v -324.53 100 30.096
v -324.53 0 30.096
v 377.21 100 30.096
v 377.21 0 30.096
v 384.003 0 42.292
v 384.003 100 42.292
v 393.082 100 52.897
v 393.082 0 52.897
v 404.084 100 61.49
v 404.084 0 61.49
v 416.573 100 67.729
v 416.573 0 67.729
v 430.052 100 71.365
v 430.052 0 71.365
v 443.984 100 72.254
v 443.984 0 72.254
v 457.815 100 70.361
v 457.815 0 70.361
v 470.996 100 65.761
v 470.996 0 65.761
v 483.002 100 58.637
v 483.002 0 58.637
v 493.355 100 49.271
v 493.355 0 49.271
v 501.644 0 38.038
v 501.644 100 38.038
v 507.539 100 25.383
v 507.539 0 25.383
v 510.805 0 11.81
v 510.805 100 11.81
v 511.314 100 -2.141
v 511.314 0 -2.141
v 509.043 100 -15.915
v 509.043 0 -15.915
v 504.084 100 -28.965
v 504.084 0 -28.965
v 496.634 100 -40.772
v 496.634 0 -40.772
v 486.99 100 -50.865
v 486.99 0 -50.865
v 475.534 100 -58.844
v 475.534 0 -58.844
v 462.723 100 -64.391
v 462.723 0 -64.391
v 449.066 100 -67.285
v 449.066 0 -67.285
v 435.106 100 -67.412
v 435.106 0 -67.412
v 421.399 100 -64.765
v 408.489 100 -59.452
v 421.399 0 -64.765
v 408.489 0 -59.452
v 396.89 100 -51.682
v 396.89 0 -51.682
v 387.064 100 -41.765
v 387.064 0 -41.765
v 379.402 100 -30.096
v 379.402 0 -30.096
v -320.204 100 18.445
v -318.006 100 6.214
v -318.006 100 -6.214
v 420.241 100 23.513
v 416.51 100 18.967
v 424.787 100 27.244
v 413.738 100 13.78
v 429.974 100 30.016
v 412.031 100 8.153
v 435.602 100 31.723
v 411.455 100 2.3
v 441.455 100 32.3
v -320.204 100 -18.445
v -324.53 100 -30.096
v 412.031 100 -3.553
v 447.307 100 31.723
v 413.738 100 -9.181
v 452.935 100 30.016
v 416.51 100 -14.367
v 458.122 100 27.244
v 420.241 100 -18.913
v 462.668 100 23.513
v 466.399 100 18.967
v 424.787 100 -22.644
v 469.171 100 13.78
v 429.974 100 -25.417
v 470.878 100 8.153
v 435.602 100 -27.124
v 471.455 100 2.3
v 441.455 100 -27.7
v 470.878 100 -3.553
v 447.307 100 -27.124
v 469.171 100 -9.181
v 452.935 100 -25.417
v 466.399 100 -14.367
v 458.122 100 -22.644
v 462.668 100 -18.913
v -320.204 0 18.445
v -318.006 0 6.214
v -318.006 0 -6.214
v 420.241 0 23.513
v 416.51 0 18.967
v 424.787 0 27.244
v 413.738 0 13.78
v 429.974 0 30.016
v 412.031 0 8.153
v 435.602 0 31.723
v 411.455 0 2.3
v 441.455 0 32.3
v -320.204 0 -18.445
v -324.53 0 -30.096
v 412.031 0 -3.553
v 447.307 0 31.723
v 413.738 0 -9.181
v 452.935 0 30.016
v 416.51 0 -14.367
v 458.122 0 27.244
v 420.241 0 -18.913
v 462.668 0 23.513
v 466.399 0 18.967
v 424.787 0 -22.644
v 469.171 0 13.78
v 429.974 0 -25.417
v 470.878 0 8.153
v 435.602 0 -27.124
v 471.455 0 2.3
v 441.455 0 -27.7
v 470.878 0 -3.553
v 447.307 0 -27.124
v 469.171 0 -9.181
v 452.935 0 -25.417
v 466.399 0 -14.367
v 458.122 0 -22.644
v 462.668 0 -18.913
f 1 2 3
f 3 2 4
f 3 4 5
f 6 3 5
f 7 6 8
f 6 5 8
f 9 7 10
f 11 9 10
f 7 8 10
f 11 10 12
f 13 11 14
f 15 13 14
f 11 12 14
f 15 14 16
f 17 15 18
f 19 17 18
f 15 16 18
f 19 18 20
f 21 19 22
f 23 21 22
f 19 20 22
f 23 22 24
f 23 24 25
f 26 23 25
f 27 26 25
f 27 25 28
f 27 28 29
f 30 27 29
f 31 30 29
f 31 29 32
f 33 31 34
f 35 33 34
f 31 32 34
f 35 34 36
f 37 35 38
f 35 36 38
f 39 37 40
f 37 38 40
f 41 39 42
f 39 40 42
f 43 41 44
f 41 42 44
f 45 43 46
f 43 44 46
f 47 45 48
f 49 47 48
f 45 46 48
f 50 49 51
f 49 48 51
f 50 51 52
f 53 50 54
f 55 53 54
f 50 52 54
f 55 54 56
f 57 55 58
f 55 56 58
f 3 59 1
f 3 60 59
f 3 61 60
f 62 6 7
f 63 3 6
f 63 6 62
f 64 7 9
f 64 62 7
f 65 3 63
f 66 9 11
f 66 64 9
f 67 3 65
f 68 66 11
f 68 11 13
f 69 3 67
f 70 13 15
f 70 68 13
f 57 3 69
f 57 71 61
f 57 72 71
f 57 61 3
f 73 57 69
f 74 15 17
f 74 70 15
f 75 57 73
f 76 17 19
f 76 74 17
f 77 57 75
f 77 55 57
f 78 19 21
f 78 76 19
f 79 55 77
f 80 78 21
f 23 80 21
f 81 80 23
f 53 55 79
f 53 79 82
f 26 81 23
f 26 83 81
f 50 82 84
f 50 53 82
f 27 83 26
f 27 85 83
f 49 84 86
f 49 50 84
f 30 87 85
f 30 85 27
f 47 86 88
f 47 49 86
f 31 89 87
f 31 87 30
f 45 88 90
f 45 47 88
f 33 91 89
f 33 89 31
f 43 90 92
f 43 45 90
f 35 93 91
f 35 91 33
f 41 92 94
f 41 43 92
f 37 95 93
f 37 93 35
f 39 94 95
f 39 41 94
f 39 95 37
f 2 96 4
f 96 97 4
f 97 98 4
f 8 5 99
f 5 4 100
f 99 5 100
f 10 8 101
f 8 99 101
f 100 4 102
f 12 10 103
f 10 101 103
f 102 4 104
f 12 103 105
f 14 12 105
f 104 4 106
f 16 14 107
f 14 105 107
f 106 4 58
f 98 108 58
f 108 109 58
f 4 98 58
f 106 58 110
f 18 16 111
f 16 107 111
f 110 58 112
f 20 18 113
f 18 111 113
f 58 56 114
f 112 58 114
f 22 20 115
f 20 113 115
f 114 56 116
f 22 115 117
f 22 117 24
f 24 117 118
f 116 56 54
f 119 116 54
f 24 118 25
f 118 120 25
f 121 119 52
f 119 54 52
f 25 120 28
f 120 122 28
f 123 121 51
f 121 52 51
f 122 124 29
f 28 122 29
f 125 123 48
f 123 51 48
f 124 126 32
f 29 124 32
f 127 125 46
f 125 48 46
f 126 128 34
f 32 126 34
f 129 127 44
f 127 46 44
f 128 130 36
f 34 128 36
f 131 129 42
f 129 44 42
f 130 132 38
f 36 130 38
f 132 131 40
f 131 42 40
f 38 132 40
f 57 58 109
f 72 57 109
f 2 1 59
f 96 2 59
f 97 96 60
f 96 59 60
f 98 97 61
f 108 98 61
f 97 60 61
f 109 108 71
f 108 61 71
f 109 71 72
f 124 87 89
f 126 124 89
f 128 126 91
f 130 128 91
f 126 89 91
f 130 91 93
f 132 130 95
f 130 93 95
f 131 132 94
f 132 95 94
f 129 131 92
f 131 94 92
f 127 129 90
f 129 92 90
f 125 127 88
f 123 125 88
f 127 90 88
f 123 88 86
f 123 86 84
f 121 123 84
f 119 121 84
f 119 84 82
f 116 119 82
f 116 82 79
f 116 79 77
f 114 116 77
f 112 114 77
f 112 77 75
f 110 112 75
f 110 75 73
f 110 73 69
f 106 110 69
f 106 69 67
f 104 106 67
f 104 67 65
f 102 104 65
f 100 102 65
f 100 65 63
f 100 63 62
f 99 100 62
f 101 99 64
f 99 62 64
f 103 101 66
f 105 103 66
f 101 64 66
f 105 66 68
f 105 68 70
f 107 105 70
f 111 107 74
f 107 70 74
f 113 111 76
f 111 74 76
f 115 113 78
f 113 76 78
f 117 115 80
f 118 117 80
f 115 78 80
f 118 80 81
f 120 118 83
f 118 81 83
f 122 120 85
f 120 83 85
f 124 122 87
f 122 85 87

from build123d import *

# Parameters (mm, degrees)
BOSS_EXTRU_2_DEPTH      = 100
ESQUISSE5_R             = 30
ENL_V_MAT_EXTRU_4_DEPTH = 101
ESQUISSE6_R             = 70
ENL_V_MAT_EXTRU_5_DEPTH = 101


with BuildPart() as part:
    # Esquisse1 → Boss.-Extru.2 (new body)
    with BuildSketch(Plane(origin=(0, 0, 0), x_dir=(1, 0, 0), z_dir=(0, 1, 0))):
        with BuildLine():
            Line((379.401849177, 30.095541494), (-327.704932009, 30.095541494))
            Line((-327.704932009, 30.095541494), (-327.704932009, -30.095541494))
            Line((-327.704932009, -30.095541494), (377.209706533, -30.095541494))
            ThreePointArc((377.209706533, -30.095541494), (511.408174051, -4.847552565), (379.401849177, 30.095541494))
        make_face()
    extrude(amount=BOSS_EXTRU_2_DEPTH)

    # Esquisse5 → Enlèv. mat.-Extru.4 (cut, through all)
    with BuildSketch(Plane(origin=(0, 100, 0), x_dir=(1, 0, 0), z_dir=(0, 1, 0))):
        with Locations((441.45455179, -2.299860933)):
            Circle(ESQUISSE5_R)
    extrude(amount=-ENL_V_MAT_EXTRU_4_DEPTH, mode=Mode.SUBTRACT)

    # Esquisse6 → Enlèv. mat.-Extru.5 (cut, through all)
    with BuildSketch(Plane(origin=(0, 100, 0), x_dir=(1, 0, 0), z_dir=(0, 1, 0))):
        with Locations((-387.729757148, 0)):
            Circle(ESQUISSE6_R)
    extrude(amount=-ENL_V_MAT_EXTRU_5_DEPTH, mode=Mode.SUBTRACT)


solid = part.part
